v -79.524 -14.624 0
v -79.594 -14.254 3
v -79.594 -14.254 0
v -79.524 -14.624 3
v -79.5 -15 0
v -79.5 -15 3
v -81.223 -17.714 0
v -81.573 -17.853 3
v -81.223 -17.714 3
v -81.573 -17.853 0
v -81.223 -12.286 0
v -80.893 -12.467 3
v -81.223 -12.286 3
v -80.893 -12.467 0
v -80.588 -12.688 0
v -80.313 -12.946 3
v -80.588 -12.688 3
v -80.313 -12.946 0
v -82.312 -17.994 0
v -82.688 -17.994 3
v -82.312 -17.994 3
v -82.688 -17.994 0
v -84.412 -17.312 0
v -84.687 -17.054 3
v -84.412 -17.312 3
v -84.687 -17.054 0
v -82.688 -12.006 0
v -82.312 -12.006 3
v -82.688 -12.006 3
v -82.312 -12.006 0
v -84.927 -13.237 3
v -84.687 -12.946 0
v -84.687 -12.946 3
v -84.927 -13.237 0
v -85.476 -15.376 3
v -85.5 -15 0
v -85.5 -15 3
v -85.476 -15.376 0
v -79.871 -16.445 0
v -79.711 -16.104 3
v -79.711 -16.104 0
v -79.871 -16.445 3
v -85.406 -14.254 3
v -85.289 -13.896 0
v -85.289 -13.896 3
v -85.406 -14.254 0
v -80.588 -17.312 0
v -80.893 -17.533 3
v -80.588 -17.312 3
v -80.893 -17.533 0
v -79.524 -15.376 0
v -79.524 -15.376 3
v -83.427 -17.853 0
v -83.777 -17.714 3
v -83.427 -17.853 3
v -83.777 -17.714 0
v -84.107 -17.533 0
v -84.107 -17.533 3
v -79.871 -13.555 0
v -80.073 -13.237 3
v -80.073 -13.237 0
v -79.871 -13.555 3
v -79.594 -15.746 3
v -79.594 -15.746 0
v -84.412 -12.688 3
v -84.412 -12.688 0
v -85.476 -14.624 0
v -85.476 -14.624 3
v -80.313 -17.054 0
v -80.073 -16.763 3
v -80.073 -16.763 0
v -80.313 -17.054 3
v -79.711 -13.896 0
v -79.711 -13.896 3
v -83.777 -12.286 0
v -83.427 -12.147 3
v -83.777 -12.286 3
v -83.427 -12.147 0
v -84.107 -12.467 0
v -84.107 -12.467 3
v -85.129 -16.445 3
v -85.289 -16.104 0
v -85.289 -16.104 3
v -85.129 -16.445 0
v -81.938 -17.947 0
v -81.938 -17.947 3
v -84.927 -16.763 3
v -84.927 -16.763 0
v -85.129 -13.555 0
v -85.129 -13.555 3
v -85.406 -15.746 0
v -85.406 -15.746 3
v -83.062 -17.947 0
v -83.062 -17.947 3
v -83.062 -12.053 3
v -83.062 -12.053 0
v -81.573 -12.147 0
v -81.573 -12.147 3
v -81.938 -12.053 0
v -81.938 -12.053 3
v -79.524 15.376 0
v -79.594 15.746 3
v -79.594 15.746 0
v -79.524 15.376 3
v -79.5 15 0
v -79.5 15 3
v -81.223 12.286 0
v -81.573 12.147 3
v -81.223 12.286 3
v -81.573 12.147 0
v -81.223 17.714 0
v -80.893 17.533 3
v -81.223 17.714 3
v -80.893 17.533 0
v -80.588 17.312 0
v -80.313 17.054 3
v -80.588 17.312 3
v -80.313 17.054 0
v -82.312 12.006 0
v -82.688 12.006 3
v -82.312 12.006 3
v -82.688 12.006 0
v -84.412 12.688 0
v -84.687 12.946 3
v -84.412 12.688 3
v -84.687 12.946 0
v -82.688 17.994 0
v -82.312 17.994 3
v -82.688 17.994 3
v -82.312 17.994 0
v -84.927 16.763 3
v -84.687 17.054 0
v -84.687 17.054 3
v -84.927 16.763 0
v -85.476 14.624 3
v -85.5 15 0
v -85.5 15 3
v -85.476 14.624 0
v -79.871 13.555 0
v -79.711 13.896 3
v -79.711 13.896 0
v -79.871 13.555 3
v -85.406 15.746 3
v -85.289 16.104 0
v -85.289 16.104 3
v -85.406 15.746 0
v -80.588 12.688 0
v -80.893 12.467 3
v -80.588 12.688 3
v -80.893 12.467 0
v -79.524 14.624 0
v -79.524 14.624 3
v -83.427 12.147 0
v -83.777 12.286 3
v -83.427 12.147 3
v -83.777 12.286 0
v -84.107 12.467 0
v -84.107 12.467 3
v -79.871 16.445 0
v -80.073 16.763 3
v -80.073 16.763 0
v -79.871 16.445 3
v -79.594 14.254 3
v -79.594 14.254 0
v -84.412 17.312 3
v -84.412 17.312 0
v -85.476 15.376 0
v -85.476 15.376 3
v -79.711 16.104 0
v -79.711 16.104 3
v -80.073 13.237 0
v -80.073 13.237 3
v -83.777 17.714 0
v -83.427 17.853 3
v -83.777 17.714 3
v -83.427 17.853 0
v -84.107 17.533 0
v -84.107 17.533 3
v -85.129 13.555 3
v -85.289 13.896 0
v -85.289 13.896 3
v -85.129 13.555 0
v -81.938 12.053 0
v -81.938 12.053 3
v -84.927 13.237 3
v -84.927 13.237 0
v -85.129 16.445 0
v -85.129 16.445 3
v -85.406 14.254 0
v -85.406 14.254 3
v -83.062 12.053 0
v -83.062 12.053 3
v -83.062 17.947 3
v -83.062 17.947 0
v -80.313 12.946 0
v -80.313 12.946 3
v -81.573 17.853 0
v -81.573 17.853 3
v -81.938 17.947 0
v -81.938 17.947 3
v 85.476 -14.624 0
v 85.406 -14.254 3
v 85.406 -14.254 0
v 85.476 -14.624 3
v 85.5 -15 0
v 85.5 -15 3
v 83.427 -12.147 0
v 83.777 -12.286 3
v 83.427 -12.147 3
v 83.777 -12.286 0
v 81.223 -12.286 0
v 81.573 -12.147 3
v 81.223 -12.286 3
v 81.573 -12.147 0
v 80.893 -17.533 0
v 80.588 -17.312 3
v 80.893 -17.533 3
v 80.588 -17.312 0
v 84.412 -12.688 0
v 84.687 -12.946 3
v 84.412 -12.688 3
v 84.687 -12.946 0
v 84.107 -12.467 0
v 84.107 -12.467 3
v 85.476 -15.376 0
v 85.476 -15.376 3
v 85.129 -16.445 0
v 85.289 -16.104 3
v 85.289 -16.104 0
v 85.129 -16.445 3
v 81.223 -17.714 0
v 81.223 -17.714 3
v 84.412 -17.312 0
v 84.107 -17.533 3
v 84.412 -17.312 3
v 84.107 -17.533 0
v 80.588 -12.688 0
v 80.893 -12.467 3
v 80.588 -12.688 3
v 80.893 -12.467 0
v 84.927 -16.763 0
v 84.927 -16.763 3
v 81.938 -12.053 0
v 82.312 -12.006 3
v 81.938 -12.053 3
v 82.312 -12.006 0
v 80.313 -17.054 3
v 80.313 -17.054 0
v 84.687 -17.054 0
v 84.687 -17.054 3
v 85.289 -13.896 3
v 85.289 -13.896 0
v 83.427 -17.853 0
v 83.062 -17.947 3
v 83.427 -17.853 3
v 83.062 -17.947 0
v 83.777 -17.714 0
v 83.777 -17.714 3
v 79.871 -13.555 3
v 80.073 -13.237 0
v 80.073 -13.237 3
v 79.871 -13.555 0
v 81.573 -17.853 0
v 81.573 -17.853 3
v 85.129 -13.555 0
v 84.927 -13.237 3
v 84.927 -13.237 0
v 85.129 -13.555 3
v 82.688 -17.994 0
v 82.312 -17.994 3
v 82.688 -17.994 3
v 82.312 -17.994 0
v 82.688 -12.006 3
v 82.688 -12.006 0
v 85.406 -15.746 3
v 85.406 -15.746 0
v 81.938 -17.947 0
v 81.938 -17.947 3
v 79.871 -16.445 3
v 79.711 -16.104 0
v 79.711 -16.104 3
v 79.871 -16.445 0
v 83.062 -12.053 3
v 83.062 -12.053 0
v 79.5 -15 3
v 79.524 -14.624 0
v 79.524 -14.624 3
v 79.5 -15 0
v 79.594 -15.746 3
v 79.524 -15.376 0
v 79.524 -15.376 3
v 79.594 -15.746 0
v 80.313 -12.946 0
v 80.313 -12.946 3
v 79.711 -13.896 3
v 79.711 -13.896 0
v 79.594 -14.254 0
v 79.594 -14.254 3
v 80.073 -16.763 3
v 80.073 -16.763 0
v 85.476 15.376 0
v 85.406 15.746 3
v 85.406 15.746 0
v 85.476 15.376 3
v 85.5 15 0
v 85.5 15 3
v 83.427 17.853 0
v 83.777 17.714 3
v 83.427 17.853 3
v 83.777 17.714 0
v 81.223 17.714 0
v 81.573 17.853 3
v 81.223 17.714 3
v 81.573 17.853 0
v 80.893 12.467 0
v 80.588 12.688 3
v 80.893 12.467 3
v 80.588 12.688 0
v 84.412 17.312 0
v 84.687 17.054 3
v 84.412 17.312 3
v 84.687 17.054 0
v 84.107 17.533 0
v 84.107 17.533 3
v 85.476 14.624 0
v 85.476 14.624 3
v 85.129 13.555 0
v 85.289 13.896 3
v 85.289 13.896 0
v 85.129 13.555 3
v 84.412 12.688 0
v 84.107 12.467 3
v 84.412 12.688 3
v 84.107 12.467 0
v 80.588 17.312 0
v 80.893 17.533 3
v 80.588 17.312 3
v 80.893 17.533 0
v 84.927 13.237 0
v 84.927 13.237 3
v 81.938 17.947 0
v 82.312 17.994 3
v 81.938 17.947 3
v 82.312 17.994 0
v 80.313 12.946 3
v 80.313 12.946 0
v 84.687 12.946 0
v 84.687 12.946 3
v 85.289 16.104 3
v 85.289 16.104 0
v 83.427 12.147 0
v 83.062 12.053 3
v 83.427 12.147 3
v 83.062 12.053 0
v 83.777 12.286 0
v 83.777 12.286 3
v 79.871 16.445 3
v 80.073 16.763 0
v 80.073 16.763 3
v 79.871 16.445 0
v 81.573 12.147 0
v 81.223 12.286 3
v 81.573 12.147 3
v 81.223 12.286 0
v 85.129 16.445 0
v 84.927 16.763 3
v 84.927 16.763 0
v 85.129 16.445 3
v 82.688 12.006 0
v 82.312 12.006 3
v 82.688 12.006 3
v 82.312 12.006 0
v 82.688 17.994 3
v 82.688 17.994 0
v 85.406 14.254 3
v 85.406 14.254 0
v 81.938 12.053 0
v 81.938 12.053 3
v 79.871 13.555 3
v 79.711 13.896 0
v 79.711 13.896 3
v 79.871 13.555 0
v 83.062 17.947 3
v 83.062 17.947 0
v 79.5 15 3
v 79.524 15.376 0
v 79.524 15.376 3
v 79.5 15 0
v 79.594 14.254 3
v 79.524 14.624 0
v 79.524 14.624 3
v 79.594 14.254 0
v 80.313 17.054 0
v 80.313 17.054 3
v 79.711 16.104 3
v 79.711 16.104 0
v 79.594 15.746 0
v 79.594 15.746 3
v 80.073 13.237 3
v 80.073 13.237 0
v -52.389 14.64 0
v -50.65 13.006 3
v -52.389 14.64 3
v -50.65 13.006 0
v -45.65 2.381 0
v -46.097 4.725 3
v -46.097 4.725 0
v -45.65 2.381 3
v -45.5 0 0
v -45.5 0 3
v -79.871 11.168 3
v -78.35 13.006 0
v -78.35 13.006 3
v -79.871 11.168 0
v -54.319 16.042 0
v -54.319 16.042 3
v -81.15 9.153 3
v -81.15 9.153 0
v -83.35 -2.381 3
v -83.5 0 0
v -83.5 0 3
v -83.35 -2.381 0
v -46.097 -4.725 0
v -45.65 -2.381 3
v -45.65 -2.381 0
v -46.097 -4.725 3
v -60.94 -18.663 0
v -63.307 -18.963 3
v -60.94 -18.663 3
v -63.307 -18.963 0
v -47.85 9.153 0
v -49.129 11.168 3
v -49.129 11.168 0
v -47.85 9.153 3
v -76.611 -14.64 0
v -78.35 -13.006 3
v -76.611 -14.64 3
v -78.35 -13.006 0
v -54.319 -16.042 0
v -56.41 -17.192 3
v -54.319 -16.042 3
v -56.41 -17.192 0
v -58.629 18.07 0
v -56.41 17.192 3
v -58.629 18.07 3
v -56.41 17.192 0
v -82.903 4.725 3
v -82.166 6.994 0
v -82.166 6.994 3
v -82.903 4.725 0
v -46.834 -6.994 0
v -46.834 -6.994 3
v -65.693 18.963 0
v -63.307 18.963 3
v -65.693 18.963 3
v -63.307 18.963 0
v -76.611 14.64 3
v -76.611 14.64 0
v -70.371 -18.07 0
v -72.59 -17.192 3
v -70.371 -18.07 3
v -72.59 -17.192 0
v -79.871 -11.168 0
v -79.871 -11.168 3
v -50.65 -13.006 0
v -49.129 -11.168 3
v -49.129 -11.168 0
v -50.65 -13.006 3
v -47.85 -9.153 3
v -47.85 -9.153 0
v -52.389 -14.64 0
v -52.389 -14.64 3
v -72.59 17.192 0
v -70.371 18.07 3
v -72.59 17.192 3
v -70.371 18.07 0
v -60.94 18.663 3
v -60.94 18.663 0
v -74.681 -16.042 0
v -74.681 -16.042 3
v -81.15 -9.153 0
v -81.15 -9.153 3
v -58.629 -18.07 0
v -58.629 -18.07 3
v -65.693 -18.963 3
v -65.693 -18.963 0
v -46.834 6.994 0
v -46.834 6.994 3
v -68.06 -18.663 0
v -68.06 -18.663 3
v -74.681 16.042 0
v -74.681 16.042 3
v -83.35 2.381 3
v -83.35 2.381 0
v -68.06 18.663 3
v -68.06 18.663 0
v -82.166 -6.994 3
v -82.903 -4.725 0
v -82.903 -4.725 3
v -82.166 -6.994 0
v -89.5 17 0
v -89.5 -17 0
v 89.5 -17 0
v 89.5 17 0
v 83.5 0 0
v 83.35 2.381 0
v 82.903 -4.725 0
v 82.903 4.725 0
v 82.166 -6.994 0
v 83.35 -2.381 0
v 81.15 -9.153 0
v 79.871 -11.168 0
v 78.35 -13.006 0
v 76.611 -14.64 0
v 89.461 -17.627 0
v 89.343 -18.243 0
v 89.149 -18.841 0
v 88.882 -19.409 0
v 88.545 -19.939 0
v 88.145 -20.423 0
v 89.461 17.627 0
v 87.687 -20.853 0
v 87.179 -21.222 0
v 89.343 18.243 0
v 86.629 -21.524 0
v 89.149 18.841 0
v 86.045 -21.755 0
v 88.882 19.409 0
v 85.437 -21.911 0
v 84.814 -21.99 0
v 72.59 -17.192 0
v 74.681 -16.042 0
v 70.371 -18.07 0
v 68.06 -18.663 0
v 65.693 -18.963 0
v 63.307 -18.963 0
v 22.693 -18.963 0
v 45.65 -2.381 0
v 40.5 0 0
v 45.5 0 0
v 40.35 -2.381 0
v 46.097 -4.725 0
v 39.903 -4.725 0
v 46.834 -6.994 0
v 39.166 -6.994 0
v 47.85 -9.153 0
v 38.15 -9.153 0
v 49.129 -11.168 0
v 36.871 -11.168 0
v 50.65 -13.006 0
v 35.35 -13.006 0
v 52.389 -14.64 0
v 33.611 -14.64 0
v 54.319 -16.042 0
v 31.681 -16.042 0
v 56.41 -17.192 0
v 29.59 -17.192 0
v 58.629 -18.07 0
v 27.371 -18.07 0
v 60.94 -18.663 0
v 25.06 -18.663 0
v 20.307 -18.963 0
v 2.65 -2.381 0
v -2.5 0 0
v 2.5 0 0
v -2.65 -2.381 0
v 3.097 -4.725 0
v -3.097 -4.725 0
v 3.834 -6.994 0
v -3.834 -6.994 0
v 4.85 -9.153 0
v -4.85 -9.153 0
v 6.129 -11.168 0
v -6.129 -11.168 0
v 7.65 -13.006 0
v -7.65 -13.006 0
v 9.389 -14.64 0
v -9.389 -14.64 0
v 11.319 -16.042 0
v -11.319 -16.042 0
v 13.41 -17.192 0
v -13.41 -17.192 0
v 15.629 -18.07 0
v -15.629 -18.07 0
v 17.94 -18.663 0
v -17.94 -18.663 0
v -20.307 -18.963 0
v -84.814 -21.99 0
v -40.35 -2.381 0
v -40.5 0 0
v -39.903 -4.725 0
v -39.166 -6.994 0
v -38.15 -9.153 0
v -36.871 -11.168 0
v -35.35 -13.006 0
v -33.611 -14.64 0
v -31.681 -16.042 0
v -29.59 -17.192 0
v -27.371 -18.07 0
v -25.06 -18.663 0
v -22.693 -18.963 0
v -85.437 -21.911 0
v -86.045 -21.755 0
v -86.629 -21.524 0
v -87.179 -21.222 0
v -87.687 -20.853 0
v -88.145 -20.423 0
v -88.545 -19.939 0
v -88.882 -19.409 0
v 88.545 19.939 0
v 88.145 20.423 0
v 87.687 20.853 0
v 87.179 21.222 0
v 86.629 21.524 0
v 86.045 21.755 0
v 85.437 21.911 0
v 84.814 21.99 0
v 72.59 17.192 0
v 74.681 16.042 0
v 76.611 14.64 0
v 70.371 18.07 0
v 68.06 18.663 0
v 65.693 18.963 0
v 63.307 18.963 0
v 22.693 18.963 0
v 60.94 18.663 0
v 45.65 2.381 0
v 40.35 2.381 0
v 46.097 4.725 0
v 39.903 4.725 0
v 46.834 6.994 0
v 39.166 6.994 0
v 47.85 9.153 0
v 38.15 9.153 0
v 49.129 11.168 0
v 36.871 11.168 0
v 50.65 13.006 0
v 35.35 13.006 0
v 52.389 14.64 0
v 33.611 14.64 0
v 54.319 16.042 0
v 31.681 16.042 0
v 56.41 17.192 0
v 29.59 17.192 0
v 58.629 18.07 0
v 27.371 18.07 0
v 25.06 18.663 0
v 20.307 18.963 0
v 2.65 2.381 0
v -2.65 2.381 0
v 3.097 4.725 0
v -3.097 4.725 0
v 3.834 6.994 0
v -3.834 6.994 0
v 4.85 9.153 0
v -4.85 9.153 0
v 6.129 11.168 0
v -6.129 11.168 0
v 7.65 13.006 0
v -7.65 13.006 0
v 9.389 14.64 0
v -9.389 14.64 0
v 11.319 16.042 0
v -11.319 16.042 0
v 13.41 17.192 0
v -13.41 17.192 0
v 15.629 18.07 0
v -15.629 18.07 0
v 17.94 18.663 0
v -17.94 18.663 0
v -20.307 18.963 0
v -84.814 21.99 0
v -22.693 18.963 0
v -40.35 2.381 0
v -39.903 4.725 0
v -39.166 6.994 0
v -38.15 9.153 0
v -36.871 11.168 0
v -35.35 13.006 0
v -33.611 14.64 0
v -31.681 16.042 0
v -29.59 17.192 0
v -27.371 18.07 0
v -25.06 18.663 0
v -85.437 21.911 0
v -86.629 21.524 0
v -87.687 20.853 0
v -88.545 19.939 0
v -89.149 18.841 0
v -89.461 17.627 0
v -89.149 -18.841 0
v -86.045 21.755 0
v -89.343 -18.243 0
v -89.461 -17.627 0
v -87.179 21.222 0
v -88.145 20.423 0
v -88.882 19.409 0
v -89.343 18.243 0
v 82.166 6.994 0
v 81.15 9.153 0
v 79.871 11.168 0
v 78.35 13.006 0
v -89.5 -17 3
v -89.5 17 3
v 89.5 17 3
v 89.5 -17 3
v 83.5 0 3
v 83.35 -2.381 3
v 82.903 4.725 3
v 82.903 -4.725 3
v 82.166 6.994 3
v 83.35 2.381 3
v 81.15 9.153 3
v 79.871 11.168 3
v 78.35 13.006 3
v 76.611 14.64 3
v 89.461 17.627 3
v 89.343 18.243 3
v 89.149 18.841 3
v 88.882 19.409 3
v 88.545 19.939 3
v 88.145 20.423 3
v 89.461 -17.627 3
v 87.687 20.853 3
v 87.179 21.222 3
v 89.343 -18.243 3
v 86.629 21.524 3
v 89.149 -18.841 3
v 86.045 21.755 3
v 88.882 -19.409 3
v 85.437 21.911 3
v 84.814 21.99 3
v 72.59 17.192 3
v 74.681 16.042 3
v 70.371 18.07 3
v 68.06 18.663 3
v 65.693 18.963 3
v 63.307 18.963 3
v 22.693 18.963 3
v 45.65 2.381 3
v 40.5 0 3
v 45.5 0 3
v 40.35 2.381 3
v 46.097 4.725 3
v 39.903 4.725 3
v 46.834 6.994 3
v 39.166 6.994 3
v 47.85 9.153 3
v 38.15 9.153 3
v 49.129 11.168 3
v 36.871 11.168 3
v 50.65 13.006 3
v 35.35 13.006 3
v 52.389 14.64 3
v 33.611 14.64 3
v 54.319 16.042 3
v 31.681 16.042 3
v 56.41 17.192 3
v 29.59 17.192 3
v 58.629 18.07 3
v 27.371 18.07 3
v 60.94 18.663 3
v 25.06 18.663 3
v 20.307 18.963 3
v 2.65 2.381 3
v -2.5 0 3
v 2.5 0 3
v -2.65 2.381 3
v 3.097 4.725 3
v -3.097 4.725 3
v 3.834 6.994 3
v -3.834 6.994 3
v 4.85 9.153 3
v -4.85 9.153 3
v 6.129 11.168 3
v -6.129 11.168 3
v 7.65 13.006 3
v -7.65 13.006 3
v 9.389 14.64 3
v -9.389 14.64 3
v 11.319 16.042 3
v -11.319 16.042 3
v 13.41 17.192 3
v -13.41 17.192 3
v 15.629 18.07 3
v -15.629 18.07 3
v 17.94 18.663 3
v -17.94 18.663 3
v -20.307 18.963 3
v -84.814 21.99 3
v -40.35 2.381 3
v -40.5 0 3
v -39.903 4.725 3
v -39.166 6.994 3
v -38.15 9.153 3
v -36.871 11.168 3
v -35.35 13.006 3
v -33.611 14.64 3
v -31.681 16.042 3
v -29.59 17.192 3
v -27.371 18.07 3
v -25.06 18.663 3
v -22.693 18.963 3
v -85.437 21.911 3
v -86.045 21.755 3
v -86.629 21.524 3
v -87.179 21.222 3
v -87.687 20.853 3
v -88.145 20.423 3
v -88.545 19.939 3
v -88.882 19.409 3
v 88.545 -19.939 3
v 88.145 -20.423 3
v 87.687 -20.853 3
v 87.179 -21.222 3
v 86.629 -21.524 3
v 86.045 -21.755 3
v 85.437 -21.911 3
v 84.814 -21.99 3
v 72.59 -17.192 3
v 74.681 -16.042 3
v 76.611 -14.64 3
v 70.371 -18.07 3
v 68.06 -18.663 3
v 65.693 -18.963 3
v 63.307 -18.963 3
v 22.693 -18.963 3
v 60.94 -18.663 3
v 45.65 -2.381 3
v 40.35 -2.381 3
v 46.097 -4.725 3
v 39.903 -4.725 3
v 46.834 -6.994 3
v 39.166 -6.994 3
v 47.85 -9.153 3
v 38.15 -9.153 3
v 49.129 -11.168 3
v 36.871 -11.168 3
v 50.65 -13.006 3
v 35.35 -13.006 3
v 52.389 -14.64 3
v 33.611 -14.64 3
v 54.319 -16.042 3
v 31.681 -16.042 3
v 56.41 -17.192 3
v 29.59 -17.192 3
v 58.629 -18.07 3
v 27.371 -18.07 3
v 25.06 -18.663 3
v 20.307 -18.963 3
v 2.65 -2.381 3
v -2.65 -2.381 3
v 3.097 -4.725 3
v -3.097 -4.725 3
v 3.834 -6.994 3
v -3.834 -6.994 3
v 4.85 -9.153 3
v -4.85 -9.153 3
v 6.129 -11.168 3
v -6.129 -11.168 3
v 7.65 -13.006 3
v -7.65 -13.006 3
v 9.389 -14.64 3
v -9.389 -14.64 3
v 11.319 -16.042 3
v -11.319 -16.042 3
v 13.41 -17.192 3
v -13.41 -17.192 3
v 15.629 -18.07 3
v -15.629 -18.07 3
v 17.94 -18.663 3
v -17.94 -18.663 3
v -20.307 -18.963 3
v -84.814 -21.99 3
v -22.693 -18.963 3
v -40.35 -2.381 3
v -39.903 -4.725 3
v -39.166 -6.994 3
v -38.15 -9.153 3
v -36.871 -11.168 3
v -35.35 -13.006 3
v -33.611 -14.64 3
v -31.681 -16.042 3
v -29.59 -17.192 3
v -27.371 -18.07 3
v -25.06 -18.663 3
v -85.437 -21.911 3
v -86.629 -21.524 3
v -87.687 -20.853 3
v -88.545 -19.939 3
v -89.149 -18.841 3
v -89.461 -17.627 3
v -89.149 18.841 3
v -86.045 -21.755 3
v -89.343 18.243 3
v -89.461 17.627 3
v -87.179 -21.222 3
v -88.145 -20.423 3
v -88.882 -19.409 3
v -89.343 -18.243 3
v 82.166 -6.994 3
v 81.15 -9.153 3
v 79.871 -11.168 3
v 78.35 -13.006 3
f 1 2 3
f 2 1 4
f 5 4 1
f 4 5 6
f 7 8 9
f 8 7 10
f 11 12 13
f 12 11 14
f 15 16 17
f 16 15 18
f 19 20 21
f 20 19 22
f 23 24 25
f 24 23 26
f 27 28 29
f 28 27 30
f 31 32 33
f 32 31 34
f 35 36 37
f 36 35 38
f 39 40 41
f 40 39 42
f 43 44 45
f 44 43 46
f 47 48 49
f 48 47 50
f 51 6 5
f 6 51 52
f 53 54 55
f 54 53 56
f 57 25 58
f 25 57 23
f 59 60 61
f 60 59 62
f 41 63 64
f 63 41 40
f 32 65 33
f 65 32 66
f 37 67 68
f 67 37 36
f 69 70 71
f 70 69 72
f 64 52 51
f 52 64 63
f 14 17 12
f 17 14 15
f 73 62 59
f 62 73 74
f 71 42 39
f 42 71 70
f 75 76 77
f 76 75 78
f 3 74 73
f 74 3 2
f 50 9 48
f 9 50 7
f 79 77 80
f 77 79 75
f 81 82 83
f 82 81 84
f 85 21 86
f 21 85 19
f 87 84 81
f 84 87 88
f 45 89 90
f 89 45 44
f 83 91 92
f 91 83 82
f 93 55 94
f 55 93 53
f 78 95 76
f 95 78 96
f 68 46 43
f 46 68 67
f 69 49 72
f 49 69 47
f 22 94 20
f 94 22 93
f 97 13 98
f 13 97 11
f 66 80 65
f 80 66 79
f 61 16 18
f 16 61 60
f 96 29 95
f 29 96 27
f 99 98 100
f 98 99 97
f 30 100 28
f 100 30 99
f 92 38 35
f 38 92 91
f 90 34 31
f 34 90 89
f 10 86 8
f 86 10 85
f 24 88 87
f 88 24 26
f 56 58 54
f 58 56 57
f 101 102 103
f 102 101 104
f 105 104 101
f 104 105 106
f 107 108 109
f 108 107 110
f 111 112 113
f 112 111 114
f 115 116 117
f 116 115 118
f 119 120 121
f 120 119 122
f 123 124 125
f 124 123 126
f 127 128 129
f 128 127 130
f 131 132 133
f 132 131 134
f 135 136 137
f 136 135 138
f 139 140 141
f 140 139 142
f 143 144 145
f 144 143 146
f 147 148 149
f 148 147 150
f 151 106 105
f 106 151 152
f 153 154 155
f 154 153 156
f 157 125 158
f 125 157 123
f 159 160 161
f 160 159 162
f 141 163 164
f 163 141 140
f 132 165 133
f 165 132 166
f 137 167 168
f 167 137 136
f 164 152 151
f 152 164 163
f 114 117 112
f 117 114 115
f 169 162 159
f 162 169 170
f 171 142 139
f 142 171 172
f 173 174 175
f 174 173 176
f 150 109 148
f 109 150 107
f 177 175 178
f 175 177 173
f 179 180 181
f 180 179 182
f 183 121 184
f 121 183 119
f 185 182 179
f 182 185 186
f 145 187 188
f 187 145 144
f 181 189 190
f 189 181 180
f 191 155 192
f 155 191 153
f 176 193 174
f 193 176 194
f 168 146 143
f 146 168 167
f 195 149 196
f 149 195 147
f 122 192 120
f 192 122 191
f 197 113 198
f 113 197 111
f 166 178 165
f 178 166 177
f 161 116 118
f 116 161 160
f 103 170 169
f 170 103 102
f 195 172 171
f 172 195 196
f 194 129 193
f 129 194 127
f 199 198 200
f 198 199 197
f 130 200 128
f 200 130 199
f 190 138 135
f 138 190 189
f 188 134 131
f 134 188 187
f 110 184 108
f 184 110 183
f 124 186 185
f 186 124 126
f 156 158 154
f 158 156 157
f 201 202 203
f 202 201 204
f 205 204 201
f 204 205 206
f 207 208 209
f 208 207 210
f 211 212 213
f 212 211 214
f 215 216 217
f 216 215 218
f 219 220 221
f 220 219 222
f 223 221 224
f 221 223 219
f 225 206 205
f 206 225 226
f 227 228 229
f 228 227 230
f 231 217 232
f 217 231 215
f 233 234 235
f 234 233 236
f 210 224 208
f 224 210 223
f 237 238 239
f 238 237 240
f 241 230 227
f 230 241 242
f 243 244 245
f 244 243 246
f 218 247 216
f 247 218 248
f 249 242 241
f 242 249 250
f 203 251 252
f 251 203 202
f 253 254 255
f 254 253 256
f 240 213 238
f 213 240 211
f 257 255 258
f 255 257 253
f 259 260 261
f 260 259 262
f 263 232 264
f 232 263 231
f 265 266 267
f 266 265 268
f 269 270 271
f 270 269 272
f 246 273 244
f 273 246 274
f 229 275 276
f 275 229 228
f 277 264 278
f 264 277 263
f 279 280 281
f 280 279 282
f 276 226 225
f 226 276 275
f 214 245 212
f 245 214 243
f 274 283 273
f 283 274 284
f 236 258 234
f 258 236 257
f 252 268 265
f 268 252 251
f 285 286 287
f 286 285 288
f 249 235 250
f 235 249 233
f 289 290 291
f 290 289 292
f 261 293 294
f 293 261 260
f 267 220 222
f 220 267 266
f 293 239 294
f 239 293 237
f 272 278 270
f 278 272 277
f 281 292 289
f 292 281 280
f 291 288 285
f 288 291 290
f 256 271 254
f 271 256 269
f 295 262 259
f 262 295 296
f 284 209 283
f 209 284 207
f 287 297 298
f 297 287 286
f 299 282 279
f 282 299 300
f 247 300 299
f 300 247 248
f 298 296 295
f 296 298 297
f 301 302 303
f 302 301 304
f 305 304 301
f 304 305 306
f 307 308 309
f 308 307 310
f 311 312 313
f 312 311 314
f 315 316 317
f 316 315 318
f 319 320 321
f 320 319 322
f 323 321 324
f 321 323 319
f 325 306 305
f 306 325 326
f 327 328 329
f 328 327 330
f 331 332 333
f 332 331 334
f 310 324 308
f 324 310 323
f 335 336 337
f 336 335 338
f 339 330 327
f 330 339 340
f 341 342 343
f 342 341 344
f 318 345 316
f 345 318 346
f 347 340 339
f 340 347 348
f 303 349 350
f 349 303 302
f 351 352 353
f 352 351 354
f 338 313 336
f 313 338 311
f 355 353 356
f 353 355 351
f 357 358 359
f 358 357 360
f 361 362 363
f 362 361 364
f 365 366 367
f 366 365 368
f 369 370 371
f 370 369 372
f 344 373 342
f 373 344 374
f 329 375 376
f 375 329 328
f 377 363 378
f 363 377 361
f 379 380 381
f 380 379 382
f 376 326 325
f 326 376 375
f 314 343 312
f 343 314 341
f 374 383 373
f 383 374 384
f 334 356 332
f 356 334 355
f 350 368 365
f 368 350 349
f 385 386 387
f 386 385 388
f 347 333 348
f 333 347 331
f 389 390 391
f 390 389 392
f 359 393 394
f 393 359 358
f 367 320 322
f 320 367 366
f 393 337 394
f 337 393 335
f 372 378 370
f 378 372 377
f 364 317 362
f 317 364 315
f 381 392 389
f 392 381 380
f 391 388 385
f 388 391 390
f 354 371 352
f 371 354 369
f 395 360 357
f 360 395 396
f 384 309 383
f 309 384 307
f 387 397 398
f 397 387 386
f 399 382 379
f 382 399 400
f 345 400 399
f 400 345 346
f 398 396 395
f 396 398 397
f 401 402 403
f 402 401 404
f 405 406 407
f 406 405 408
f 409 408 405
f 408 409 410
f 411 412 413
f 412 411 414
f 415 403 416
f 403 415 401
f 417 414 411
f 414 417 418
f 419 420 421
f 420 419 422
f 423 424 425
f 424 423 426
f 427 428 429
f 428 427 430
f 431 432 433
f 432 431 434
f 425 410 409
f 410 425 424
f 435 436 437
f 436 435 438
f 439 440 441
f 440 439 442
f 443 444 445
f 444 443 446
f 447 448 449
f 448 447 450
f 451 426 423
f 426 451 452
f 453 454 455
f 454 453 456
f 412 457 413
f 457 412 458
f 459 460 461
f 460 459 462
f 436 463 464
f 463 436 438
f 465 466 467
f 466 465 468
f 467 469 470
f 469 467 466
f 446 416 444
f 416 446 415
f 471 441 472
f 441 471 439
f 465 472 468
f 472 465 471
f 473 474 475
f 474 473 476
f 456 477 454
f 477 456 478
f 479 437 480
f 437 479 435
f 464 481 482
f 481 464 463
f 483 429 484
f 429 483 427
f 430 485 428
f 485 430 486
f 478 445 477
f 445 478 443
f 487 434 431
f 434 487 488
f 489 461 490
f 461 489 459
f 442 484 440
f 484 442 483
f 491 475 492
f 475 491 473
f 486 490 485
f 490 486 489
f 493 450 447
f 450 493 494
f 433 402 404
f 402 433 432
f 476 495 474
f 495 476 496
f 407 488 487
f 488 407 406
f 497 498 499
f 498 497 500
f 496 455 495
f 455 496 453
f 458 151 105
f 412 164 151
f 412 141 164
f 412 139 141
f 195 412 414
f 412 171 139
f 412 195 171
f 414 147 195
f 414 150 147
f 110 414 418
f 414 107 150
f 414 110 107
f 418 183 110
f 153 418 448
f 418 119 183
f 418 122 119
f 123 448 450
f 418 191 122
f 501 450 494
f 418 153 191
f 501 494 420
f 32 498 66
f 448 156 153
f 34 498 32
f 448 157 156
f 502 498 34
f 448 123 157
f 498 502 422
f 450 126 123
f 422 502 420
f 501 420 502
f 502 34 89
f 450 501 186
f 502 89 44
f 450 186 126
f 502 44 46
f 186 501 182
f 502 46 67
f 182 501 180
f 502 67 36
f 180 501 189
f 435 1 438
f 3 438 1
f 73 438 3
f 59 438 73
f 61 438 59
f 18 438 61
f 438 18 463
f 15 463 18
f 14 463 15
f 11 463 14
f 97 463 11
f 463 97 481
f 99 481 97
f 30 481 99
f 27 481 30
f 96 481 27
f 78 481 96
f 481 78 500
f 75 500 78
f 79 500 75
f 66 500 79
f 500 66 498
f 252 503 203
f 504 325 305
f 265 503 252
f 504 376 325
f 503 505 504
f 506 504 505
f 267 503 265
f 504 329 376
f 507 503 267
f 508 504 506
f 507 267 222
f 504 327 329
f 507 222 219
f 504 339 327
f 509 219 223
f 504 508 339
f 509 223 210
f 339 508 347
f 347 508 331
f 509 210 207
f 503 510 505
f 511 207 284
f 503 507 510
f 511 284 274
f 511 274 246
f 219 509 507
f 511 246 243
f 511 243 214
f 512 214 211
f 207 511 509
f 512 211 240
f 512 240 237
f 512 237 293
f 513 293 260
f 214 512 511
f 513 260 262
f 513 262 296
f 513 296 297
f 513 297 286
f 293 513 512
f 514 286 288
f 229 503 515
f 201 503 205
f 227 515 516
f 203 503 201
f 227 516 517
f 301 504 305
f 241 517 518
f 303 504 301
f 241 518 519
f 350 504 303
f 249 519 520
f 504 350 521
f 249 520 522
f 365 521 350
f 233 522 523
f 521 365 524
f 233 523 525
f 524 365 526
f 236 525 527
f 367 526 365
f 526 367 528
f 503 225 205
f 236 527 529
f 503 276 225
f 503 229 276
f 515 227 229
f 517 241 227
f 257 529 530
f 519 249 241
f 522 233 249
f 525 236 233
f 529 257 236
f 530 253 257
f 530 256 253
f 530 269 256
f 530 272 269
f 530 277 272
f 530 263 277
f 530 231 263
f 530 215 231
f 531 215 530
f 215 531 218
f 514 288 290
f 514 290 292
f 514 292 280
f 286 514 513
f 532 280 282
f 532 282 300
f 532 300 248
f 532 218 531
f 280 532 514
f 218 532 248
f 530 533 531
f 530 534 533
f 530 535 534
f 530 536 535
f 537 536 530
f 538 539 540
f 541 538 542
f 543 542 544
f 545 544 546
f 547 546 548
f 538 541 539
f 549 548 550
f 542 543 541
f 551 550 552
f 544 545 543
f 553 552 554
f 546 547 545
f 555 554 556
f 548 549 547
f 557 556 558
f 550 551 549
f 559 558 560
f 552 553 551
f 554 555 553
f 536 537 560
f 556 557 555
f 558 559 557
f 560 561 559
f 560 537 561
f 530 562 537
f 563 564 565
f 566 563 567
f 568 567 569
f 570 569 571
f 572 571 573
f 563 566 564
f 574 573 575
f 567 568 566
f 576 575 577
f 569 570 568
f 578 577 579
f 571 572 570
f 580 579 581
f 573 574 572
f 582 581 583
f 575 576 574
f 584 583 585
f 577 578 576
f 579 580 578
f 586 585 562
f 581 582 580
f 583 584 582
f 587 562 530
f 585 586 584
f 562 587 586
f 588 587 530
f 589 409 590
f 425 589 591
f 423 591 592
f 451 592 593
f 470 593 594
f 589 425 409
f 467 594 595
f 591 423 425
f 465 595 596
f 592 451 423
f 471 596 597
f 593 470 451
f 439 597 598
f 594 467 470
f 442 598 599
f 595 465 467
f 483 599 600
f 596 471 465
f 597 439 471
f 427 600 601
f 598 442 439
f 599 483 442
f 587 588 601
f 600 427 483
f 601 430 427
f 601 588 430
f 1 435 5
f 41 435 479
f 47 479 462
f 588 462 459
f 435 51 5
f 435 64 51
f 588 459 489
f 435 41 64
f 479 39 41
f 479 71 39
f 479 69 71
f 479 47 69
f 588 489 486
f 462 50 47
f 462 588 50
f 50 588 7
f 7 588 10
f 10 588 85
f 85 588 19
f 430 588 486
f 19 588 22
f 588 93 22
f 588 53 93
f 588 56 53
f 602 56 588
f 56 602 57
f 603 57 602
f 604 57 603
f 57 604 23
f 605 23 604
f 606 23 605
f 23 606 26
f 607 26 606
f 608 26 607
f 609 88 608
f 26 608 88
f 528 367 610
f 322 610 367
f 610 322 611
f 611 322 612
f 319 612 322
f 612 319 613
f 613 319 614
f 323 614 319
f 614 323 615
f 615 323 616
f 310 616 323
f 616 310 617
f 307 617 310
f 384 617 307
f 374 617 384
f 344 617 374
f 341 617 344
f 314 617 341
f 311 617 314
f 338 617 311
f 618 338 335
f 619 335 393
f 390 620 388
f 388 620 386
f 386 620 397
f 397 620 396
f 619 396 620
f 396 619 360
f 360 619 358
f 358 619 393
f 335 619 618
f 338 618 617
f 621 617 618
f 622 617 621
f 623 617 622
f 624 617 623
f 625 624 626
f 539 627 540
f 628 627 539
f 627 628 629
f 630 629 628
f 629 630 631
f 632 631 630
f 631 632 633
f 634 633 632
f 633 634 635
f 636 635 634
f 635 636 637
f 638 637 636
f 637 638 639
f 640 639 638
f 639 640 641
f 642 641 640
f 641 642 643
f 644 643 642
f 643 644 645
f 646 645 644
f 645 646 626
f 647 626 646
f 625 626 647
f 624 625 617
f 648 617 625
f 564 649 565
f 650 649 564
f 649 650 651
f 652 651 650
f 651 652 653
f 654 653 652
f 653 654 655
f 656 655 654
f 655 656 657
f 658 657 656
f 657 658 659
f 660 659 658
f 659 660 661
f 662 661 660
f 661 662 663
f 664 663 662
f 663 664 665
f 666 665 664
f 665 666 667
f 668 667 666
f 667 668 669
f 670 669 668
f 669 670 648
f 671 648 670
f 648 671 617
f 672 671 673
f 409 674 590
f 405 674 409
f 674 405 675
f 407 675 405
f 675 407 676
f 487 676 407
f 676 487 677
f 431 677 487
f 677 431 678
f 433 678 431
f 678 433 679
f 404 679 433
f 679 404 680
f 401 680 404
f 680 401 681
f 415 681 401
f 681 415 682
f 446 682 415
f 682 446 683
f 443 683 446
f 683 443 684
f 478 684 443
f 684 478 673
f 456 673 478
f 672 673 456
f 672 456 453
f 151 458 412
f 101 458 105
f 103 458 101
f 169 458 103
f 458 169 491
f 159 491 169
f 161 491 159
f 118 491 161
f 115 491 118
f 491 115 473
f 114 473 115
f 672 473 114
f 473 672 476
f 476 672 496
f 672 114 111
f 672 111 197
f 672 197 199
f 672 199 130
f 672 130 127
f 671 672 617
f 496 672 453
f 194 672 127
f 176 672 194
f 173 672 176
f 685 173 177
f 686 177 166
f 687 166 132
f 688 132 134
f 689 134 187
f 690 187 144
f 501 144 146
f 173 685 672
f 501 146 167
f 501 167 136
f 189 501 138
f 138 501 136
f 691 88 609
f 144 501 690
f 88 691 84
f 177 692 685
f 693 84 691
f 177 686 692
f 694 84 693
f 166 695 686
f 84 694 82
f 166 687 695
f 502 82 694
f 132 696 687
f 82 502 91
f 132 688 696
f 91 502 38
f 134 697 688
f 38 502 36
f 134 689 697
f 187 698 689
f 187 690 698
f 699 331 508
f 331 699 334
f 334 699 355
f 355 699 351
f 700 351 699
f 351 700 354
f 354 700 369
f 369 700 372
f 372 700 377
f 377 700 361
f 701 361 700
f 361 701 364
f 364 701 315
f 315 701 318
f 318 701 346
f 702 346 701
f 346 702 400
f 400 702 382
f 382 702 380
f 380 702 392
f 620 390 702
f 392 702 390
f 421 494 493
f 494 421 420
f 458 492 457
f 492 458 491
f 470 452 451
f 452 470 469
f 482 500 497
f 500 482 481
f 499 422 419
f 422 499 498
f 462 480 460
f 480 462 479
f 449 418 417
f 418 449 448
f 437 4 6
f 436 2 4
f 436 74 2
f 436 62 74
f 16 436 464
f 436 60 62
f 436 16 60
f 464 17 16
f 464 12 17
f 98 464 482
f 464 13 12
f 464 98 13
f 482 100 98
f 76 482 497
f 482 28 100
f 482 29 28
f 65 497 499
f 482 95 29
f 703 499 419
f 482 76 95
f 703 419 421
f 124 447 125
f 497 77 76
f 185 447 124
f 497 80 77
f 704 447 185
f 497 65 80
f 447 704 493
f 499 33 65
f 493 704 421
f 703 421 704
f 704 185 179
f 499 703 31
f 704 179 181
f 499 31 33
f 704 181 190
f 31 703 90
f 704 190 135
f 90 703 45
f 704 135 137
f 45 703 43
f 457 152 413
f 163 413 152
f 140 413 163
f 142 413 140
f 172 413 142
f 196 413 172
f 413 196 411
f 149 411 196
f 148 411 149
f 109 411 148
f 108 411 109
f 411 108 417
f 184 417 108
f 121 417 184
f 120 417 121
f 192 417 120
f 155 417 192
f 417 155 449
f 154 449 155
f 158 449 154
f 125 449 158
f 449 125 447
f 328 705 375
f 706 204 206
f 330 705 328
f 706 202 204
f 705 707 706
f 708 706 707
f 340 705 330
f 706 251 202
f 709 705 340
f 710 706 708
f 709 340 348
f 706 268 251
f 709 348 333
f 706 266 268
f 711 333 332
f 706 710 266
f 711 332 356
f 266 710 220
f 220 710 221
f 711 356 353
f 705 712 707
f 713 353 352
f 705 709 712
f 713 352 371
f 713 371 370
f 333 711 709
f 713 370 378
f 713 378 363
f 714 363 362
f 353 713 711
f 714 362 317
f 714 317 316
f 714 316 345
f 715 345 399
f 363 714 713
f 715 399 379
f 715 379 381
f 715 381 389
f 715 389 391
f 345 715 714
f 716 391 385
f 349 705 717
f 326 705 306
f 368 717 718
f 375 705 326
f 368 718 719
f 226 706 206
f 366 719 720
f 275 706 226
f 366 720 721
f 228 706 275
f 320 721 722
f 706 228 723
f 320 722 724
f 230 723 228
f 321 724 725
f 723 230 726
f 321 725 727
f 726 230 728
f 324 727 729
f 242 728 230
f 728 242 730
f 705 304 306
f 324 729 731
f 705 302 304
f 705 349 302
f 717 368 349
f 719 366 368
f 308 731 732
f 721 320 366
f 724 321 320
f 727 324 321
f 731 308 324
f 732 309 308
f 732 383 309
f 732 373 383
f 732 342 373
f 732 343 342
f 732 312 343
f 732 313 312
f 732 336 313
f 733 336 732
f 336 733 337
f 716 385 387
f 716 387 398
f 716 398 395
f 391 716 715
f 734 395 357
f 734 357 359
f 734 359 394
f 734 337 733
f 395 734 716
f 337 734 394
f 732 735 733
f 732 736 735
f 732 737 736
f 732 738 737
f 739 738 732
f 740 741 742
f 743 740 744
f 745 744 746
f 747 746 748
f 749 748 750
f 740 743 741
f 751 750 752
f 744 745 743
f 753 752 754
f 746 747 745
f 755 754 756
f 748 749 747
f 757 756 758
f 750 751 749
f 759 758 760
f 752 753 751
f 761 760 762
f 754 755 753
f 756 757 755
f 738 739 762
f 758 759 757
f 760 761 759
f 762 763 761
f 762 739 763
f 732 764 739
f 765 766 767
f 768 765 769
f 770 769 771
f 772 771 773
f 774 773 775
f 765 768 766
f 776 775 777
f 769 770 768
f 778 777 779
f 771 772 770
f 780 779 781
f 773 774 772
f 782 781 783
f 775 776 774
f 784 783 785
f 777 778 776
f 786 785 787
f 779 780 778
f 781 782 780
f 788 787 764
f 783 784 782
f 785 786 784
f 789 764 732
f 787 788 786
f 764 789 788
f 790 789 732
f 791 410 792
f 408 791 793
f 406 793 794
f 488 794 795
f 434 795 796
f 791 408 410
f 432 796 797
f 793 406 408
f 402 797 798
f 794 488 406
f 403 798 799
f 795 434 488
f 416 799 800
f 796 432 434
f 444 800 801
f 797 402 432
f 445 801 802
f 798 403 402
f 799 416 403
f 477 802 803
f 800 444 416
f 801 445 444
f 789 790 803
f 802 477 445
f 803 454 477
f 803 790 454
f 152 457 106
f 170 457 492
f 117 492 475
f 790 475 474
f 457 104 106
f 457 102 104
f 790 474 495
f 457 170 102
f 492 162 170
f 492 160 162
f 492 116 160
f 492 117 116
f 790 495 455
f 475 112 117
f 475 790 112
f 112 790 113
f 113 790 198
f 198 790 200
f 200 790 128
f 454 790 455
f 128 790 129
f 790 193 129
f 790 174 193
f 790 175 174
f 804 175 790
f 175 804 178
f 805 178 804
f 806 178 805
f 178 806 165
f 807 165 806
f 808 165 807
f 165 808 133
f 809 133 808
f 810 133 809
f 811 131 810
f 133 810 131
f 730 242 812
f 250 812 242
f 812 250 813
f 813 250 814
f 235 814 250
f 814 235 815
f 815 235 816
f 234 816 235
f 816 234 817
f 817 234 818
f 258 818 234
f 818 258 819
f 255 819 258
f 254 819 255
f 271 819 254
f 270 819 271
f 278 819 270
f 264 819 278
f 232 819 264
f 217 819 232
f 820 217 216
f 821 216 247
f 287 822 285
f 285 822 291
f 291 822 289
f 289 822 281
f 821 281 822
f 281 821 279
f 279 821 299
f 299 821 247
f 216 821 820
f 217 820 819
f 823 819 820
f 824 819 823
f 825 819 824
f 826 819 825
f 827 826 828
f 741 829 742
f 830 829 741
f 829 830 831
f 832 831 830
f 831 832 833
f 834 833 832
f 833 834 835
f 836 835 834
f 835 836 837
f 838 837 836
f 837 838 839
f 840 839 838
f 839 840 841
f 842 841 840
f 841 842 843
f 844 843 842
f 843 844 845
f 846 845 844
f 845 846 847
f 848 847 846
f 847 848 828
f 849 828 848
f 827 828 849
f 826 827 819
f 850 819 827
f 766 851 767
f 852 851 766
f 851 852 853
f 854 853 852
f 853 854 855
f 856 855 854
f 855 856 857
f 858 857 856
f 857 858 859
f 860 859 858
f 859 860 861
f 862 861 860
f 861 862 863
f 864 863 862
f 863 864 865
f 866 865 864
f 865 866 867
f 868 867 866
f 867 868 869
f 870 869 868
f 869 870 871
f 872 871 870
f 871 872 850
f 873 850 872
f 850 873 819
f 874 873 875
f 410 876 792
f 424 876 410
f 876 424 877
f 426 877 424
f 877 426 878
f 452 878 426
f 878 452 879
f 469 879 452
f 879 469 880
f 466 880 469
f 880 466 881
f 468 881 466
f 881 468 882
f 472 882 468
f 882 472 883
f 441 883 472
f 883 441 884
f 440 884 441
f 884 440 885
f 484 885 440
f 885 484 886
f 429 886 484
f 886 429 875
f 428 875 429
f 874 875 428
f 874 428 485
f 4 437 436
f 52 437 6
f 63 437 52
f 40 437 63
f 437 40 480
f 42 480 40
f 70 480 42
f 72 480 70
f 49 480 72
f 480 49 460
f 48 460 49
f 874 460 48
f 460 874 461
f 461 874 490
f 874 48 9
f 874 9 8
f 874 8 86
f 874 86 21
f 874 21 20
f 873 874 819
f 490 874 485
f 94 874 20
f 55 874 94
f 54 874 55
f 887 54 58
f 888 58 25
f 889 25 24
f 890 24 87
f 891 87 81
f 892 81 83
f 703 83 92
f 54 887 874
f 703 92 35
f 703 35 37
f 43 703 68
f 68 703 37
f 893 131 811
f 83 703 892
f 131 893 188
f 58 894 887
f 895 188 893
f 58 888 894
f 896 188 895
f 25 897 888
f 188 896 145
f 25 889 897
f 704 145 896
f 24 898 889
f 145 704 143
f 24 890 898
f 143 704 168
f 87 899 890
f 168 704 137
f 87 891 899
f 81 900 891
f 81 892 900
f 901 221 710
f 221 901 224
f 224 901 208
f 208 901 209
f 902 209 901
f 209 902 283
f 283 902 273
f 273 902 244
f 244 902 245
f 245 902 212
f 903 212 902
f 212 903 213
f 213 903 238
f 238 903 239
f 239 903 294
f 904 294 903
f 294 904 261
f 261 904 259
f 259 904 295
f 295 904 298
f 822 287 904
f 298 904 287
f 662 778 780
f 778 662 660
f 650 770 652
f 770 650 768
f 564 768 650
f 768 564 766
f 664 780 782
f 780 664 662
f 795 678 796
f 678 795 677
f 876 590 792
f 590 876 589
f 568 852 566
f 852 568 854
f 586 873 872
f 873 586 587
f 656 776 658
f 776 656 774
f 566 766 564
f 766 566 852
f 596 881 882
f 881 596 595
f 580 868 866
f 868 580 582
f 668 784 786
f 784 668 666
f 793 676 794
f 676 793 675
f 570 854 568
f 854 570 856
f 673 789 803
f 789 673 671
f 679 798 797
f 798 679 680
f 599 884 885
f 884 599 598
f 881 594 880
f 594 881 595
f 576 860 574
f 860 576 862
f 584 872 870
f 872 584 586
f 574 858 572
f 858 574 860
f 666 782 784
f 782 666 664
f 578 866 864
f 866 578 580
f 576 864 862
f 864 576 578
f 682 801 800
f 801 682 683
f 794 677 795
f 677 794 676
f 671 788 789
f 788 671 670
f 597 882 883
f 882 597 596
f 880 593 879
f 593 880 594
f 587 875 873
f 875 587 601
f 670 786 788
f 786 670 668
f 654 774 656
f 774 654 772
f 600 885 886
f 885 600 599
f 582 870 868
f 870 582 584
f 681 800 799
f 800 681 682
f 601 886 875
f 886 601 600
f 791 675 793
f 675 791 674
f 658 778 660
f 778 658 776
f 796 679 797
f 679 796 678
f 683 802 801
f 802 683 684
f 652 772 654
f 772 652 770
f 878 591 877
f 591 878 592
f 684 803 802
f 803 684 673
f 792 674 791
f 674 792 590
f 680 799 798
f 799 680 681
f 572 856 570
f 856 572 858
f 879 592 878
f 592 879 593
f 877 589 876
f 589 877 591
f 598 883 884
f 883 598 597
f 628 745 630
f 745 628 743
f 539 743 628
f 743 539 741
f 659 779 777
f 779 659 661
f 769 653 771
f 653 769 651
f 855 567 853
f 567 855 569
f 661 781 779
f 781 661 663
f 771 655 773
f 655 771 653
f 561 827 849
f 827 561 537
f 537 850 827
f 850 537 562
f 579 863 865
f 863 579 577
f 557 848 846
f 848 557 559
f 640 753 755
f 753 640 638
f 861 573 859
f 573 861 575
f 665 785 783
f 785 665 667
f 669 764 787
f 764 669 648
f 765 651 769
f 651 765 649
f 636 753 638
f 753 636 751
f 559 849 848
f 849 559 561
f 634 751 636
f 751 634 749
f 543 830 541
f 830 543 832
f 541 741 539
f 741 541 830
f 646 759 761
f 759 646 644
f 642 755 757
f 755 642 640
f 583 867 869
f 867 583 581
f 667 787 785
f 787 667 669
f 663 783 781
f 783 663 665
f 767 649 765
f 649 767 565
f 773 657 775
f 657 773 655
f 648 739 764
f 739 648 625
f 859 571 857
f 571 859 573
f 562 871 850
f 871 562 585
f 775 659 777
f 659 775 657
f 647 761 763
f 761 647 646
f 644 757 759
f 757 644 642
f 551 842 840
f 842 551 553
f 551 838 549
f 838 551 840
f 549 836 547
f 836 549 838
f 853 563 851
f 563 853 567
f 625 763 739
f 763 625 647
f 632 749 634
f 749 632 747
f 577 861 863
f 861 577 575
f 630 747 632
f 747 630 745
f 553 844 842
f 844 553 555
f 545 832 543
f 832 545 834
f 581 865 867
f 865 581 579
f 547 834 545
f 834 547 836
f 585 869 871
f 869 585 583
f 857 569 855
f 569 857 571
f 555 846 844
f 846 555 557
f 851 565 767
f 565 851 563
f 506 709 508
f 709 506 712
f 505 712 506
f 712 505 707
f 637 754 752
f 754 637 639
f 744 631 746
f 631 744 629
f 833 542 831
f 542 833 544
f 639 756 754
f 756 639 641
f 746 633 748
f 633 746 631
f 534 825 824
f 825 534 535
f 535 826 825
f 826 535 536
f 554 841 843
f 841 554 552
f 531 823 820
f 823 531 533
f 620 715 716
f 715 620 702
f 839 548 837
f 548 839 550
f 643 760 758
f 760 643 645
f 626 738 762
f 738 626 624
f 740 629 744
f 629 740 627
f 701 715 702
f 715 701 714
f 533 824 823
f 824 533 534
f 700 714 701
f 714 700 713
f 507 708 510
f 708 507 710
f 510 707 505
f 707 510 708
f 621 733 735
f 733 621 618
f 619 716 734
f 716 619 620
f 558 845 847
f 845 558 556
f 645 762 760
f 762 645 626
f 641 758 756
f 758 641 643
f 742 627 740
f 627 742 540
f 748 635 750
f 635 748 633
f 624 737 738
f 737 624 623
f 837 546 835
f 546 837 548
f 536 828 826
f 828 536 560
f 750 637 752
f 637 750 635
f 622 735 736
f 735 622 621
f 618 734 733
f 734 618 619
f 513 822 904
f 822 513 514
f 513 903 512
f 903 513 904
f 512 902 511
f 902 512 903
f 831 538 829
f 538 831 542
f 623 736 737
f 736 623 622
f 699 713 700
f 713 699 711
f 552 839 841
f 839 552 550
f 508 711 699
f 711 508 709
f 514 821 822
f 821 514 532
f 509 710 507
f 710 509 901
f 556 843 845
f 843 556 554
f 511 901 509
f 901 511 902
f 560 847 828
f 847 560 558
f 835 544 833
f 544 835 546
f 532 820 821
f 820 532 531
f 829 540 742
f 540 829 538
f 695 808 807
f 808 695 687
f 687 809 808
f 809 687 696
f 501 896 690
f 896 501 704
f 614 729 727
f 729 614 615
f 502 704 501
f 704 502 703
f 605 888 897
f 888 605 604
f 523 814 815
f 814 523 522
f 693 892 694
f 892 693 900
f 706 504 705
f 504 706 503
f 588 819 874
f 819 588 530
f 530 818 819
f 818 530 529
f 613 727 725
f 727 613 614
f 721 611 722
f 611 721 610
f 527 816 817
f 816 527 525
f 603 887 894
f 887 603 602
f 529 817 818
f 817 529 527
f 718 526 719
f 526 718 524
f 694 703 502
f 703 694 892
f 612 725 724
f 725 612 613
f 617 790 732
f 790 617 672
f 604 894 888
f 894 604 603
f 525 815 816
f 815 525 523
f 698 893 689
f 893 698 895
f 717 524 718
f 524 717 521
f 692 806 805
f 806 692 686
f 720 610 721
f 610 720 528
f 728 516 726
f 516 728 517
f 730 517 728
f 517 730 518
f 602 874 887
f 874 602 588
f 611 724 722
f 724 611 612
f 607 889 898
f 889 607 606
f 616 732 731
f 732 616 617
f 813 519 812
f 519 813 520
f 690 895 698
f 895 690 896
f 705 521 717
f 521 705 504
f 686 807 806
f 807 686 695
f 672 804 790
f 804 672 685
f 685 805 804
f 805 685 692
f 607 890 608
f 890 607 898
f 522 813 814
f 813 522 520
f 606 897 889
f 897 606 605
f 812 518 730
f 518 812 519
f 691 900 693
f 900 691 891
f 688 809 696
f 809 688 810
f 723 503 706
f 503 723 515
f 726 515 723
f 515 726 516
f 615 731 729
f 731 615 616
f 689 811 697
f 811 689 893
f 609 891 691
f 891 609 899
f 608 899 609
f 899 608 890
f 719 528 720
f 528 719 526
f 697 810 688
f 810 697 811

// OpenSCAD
$fn = 50;


difference() {
	union() {
		hull() {
			translate(v = [-84.5000000000, 17.0000000000, 0]) {
				cylinder(h = 3, r = 5);
			}
			translate(v = [84.5000000000, 17.0000000000, 0]) {
				cylinder(h = 3, r = 5);
			}
			translate(v = [-84.5000000000, -17.0000000000, 0]) {
				cylinder(h = 3, r = 5);
			}
			translate(v = [84.5000000000, -17.0000000000, 0]) {
				cylinder(h = 3, r = 5);
			}
		}
	}
	union() {
		#translate(v = [-82.5000000000, -15.0000000000, -100.0000000000]) {
			cylinder(h = 200, r = 3.0000000000);
		}
		#translate(v = [-82.5000000000, 15.0000000000, -100.0000000000]) {
			cylinder(h = 200, r = 3.0000000000);
		}
		#translate(v = [82.5000000000, -15.0000000000, -100.0000000000]) {
			cylinder(h = 200, r = 3.0000000000);
		}
		#translate(v = [82.5000000000, 15.0000000000, -100.0000000000]) {
			cylinder(h = 200, r = 3.0000000000);
		}
		#translate(v = [-64.5000000000, 0, 0]) {
			cylinder(h = 3, r = 19.0000000000);
		}
		#translate(v = [-21.5000000000, 0, 0]) {
			cylinder(h = 3, r = 19.0000000000);
		}
		#translate(v = [21.5000000000, 0, 0]) {
			cylinder(h = 3, r = 19.0000000000);
		}
		#translate(v = [64.5000000000, 0, 0]) {
			cylinder(h = 3, r = 19.0000000000);
		}
	}
}
